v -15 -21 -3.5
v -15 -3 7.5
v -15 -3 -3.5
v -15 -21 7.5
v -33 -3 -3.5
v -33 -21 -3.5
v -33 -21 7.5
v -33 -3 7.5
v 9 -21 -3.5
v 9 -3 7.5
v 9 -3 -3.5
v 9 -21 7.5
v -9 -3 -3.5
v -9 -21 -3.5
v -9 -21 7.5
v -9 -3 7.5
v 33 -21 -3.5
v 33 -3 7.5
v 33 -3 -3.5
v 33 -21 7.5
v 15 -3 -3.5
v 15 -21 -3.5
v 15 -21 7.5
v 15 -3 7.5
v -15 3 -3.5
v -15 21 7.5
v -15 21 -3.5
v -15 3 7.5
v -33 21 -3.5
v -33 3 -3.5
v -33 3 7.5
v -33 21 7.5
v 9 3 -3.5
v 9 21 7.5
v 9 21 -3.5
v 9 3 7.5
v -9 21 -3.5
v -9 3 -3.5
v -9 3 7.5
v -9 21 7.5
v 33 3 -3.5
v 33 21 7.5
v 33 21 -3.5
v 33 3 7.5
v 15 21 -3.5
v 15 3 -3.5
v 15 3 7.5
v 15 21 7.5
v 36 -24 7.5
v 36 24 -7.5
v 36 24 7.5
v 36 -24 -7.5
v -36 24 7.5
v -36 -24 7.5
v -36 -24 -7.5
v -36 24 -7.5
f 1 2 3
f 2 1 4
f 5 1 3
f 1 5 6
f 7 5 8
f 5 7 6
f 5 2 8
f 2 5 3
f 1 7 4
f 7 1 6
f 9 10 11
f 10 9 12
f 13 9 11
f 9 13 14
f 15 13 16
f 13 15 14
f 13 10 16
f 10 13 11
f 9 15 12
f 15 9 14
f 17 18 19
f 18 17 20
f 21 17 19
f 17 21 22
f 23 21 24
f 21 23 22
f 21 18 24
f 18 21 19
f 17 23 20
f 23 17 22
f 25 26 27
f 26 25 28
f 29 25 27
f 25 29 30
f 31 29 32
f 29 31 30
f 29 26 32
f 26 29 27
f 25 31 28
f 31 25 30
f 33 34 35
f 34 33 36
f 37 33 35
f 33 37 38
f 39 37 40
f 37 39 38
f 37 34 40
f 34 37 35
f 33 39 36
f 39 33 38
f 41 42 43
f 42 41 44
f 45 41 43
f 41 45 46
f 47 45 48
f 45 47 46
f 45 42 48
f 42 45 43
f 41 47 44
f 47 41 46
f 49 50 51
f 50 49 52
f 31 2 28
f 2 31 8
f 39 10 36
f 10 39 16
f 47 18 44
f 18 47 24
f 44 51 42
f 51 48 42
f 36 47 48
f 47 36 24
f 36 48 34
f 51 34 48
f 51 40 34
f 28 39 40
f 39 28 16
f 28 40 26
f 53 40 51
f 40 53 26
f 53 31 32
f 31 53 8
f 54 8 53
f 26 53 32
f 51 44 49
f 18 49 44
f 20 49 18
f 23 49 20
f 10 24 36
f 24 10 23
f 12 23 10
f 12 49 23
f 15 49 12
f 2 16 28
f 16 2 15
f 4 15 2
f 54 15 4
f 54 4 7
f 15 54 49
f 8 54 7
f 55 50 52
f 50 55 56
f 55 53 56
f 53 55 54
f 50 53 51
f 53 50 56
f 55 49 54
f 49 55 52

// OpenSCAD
$fn = 32;

// ----------------------------------------------------------------------
// Pocket plate 72 x 48 x 15
// 2 x 3 pockets 18 mm square, 11 mm deep
// ----------------------------------------------------------------------

// --- parameters (mm) ---
thickness = 15;  // plate thickness
floor_t = 4;     // material left under each pocket
pocket = 18;     // pocket side length
pitch_x = 24;    // pocket pitch along X
pitch_y = 24;    // pocket pitch along Y
cols = 3;        // pockets per row
rows = 2;        // rows of pockets

// --- derived feature positions (mm) ---
depth = thickness - floor_t;        // = 11   pocket depth, down to the floor
span_x = (cols - 1) * pitch_x;      // = 48   distance between outer pockets
span_y = (rows - 1) * pitch_y;      // = 24   distance between outer pocket rows
origin_x = -span_x / 2;             // = -24   X of the first pocket
origin_y = -span_y / 2;             // = -12   Y of the first pocket
plate = [span_x + pocket + 6, span_y + pocket + 6, thickness];  // = [72, 48, 15]   overall size: pockets plus 3 mm of wall on each side
feature_centers = [
  [origin_x + 0 * pitch_x, origin_y + 0 * pitch_y],
  [origin_x + 1 * pitch_x, origin_y + 0 * pitch_y],
  [origin_x + 2 * pitch_x, origin_y + 0 * pitch_y],
  [origin_x + 0 * pitch_x, origin_y + 1 * pitch_y],
  [origin_x + 1 * pitch_x, origin_y + 1 * pitch_y],
  [origin_x + 2 * pitch_x, origin_y + 1 * pitch_y]
];   // pocket centres, used verbatim by the cutter loop

// plate outline, then one pocket per centre in feature_centers
difference() {
  cube(plate, center = true);
  for (centre = feature_centers)
    translate([centre[0] - pocket / 2, centre[1] - pocket / 2, plate[2] / 2 - depth])
      cube([pocket, pocket, depth + 1]);  // centred on the declared pocket centre
}
